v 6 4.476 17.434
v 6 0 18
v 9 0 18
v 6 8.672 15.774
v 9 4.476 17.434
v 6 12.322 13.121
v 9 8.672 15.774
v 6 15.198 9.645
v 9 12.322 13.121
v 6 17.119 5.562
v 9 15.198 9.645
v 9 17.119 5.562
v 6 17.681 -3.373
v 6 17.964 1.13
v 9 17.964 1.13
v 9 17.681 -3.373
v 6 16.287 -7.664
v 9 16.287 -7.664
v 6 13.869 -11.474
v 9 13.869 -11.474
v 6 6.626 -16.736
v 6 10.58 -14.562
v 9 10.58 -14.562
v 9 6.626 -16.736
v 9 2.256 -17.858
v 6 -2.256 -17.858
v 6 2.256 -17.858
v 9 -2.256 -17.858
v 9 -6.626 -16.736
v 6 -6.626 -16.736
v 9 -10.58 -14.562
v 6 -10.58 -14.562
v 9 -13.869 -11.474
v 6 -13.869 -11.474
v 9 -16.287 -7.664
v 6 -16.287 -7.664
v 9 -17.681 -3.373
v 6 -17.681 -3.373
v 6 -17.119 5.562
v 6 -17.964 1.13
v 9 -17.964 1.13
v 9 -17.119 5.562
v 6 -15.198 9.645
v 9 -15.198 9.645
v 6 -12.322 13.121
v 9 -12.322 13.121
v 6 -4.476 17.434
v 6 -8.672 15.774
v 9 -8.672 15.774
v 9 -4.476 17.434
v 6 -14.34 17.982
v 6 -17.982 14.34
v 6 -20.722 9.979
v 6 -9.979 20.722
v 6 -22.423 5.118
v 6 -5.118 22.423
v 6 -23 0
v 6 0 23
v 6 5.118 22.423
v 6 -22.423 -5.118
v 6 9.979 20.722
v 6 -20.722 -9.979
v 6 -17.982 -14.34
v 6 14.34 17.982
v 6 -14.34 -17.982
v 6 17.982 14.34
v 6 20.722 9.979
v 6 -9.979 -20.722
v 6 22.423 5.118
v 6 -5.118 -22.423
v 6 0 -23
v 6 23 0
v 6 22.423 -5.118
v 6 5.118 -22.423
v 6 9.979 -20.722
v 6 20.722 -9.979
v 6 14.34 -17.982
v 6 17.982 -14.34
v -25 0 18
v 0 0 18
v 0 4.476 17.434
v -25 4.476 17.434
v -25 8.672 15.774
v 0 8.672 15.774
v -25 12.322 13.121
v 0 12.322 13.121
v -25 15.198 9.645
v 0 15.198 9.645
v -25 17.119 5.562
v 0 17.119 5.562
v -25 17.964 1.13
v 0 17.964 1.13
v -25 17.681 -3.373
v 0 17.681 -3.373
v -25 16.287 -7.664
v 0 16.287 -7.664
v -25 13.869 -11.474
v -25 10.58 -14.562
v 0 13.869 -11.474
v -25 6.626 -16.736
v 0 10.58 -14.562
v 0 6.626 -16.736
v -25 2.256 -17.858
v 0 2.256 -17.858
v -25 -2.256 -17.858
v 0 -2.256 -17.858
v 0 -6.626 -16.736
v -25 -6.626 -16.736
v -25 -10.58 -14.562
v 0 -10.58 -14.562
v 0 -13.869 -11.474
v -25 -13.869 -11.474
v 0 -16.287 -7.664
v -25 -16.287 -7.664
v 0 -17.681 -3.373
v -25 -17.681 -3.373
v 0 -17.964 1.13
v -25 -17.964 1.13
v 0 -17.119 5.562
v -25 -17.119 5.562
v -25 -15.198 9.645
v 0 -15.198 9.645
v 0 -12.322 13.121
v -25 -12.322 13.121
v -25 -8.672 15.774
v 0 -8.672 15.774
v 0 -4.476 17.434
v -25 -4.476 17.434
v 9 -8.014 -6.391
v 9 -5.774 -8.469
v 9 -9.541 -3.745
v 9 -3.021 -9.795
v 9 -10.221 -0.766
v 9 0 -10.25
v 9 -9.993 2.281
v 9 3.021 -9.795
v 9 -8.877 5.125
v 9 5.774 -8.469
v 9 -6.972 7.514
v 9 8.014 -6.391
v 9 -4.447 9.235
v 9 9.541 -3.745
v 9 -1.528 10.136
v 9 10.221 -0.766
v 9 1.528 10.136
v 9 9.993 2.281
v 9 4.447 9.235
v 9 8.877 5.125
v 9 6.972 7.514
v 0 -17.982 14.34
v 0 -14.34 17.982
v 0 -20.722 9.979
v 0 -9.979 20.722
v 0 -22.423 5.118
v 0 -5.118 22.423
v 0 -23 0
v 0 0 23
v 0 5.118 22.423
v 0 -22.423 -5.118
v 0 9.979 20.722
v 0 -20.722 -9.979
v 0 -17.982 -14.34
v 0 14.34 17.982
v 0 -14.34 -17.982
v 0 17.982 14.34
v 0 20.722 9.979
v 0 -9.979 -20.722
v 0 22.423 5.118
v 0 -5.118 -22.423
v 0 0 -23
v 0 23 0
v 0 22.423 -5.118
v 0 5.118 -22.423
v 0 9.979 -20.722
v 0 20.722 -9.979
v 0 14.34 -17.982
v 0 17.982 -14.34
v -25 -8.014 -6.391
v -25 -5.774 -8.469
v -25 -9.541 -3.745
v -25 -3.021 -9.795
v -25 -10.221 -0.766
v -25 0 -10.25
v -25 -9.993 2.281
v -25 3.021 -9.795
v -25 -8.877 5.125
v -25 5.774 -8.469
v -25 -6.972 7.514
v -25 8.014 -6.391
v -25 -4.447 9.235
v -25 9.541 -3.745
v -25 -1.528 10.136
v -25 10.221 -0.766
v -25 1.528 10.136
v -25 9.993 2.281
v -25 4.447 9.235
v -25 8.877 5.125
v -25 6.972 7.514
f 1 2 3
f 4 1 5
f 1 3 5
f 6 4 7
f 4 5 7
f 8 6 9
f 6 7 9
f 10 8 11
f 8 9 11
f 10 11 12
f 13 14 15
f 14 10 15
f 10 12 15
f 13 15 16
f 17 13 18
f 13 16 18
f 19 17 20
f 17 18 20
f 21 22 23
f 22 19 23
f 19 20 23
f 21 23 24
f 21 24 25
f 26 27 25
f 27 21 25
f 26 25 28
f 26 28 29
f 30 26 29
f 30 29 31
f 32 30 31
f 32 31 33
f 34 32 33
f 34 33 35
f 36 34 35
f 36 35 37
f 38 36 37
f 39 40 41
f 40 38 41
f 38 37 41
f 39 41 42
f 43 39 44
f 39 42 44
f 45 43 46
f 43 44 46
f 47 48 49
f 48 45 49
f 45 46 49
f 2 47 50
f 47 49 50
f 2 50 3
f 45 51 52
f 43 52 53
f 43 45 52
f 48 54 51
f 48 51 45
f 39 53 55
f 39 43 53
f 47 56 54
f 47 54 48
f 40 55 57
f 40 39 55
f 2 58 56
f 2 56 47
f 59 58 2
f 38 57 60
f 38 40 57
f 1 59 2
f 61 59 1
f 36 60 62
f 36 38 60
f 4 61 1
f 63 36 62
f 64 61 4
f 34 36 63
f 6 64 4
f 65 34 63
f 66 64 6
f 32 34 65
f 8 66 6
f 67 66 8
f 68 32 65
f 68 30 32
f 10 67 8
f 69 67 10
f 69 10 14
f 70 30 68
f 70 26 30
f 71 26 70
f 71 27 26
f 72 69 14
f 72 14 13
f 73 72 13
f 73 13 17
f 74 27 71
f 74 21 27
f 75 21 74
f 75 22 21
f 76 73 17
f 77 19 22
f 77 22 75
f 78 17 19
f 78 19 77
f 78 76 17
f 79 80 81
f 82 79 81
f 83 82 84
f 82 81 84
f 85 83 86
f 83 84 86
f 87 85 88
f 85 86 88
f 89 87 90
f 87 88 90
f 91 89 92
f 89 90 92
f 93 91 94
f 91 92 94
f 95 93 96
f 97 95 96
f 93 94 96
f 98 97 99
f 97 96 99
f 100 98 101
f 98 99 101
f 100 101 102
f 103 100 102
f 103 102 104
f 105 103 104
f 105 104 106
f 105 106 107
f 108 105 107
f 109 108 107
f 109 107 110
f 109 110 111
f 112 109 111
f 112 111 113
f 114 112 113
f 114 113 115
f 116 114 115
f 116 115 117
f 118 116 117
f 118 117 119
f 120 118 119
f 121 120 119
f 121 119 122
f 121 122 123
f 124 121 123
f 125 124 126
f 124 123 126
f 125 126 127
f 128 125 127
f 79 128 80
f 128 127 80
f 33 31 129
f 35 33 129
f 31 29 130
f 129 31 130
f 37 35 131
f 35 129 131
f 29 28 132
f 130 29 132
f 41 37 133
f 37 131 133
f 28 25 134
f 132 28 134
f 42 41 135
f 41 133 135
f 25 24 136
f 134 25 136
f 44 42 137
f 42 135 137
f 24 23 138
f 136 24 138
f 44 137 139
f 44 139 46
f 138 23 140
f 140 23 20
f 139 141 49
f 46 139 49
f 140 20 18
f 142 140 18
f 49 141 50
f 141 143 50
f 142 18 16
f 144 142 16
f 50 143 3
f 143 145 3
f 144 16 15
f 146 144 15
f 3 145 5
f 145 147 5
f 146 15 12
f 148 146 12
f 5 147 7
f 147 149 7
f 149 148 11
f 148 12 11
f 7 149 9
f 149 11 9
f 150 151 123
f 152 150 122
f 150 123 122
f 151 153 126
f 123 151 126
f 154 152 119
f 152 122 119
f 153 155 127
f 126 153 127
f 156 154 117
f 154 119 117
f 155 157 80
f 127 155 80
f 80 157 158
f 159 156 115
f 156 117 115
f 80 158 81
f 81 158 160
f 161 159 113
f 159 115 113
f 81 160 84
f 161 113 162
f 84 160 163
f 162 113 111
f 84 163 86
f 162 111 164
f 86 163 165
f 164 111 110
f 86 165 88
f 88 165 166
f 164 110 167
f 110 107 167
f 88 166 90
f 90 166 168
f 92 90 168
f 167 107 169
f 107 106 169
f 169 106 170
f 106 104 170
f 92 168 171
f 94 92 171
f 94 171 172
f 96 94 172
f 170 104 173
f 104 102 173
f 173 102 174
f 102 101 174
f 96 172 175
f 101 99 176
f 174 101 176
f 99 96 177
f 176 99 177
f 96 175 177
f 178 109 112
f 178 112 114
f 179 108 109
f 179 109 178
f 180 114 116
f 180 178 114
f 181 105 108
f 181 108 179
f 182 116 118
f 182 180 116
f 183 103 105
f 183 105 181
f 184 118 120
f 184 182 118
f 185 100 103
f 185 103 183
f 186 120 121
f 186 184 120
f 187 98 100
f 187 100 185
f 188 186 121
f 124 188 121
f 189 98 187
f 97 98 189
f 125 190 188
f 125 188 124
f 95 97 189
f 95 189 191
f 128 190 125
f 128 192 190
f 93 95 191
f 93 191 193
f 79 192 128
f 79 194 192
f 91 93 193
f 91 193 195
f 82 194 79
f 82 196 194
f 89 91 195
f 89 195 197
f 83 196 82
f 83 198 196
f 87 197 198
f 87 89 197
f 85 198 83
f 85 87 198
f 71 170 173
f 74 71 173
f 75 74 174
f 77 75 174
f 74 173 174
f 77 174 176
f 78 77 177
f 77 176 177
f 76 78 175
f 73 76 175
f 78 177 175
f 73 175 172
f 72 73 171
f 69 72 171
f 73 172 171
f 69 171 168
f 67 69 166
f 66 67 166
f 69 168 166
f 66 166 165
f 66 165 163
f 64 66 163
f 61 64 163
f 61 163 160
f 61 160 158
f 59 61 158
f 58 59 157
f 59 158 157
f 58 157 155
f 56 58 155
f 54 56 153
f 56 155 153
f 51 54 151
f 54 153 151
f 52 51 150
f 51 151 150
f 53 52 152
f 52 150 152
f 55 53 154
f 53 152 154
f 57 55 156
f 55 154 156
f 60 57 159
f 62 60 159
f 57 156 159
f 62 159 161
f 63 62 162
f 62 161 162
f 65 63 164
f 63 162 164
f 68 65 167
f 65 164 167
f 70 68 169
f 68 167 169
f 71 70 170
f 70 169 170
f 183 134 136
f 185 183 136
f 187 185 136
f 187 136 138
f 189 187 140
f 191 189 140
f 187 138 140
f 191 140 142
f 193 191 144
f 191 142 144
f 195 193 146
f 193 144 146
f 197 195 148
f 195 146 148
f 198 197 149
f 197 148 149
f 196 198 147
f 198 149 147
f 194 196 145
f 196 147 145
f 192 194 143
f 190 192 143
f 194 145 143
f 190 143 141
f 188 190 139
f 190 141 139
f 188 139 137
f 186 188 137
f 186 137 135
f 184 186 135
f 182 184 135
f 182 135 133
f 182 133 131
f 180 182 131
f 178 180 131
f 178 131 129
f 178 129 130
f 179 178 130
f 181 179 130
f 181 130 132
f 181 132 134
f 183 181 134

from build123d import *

# Parameters (mm, degrees)
SKETCH_1_R           = 23
EXTRUDE_1_DEPTH      = 6
EXTRUDE_2_DEPTH      = 25
EXTRUDE_2_DEPTH_BACK = 9
SKETCH_2_R           = 18
SKETCH_3_R           = 10.25
CUT_EXTRUDE_1_DEPTH  = 48.053161424


with BuildPart() as part:
    # 草图1 → 凸台-拉伸1 (new body)
    with BuildSketch(Plane(origin=(0, 0, 0), x_dir=(0, 0, -1), z_dir=(1, 0, 0))):
        Circle(SKETCH_1_R)
    extrude(amount=EXTRUDE_1_DEPTH)

    # 草图2 → 凸台-拉伸2 (add, two sides: drawn at the far end of the back side and taken through both)
    with BuildSketch(Plane.ZY.offset(-EXTRUDE_2_DEPTH_BACK)):
        Circle(SKETCH_2_R)
    extrude(amount=EXTRUDE_2_DEPTH + EXTRUDE_2_DEPTH_BACK)

    # 草图3 → 切除-拉伸1 (cut, through all)
    with BuildSketch(Plane(origin=(9, 0, 0), x_dir=(0, 0, -1), z_dir=(1, 0, 0))):
        Circle(SKETCH_3_R)
    extrude(amount=-CUT_EXTRUDE_1_DEPTH, mode=Mode.SUBTRACT)


solid = part.part
